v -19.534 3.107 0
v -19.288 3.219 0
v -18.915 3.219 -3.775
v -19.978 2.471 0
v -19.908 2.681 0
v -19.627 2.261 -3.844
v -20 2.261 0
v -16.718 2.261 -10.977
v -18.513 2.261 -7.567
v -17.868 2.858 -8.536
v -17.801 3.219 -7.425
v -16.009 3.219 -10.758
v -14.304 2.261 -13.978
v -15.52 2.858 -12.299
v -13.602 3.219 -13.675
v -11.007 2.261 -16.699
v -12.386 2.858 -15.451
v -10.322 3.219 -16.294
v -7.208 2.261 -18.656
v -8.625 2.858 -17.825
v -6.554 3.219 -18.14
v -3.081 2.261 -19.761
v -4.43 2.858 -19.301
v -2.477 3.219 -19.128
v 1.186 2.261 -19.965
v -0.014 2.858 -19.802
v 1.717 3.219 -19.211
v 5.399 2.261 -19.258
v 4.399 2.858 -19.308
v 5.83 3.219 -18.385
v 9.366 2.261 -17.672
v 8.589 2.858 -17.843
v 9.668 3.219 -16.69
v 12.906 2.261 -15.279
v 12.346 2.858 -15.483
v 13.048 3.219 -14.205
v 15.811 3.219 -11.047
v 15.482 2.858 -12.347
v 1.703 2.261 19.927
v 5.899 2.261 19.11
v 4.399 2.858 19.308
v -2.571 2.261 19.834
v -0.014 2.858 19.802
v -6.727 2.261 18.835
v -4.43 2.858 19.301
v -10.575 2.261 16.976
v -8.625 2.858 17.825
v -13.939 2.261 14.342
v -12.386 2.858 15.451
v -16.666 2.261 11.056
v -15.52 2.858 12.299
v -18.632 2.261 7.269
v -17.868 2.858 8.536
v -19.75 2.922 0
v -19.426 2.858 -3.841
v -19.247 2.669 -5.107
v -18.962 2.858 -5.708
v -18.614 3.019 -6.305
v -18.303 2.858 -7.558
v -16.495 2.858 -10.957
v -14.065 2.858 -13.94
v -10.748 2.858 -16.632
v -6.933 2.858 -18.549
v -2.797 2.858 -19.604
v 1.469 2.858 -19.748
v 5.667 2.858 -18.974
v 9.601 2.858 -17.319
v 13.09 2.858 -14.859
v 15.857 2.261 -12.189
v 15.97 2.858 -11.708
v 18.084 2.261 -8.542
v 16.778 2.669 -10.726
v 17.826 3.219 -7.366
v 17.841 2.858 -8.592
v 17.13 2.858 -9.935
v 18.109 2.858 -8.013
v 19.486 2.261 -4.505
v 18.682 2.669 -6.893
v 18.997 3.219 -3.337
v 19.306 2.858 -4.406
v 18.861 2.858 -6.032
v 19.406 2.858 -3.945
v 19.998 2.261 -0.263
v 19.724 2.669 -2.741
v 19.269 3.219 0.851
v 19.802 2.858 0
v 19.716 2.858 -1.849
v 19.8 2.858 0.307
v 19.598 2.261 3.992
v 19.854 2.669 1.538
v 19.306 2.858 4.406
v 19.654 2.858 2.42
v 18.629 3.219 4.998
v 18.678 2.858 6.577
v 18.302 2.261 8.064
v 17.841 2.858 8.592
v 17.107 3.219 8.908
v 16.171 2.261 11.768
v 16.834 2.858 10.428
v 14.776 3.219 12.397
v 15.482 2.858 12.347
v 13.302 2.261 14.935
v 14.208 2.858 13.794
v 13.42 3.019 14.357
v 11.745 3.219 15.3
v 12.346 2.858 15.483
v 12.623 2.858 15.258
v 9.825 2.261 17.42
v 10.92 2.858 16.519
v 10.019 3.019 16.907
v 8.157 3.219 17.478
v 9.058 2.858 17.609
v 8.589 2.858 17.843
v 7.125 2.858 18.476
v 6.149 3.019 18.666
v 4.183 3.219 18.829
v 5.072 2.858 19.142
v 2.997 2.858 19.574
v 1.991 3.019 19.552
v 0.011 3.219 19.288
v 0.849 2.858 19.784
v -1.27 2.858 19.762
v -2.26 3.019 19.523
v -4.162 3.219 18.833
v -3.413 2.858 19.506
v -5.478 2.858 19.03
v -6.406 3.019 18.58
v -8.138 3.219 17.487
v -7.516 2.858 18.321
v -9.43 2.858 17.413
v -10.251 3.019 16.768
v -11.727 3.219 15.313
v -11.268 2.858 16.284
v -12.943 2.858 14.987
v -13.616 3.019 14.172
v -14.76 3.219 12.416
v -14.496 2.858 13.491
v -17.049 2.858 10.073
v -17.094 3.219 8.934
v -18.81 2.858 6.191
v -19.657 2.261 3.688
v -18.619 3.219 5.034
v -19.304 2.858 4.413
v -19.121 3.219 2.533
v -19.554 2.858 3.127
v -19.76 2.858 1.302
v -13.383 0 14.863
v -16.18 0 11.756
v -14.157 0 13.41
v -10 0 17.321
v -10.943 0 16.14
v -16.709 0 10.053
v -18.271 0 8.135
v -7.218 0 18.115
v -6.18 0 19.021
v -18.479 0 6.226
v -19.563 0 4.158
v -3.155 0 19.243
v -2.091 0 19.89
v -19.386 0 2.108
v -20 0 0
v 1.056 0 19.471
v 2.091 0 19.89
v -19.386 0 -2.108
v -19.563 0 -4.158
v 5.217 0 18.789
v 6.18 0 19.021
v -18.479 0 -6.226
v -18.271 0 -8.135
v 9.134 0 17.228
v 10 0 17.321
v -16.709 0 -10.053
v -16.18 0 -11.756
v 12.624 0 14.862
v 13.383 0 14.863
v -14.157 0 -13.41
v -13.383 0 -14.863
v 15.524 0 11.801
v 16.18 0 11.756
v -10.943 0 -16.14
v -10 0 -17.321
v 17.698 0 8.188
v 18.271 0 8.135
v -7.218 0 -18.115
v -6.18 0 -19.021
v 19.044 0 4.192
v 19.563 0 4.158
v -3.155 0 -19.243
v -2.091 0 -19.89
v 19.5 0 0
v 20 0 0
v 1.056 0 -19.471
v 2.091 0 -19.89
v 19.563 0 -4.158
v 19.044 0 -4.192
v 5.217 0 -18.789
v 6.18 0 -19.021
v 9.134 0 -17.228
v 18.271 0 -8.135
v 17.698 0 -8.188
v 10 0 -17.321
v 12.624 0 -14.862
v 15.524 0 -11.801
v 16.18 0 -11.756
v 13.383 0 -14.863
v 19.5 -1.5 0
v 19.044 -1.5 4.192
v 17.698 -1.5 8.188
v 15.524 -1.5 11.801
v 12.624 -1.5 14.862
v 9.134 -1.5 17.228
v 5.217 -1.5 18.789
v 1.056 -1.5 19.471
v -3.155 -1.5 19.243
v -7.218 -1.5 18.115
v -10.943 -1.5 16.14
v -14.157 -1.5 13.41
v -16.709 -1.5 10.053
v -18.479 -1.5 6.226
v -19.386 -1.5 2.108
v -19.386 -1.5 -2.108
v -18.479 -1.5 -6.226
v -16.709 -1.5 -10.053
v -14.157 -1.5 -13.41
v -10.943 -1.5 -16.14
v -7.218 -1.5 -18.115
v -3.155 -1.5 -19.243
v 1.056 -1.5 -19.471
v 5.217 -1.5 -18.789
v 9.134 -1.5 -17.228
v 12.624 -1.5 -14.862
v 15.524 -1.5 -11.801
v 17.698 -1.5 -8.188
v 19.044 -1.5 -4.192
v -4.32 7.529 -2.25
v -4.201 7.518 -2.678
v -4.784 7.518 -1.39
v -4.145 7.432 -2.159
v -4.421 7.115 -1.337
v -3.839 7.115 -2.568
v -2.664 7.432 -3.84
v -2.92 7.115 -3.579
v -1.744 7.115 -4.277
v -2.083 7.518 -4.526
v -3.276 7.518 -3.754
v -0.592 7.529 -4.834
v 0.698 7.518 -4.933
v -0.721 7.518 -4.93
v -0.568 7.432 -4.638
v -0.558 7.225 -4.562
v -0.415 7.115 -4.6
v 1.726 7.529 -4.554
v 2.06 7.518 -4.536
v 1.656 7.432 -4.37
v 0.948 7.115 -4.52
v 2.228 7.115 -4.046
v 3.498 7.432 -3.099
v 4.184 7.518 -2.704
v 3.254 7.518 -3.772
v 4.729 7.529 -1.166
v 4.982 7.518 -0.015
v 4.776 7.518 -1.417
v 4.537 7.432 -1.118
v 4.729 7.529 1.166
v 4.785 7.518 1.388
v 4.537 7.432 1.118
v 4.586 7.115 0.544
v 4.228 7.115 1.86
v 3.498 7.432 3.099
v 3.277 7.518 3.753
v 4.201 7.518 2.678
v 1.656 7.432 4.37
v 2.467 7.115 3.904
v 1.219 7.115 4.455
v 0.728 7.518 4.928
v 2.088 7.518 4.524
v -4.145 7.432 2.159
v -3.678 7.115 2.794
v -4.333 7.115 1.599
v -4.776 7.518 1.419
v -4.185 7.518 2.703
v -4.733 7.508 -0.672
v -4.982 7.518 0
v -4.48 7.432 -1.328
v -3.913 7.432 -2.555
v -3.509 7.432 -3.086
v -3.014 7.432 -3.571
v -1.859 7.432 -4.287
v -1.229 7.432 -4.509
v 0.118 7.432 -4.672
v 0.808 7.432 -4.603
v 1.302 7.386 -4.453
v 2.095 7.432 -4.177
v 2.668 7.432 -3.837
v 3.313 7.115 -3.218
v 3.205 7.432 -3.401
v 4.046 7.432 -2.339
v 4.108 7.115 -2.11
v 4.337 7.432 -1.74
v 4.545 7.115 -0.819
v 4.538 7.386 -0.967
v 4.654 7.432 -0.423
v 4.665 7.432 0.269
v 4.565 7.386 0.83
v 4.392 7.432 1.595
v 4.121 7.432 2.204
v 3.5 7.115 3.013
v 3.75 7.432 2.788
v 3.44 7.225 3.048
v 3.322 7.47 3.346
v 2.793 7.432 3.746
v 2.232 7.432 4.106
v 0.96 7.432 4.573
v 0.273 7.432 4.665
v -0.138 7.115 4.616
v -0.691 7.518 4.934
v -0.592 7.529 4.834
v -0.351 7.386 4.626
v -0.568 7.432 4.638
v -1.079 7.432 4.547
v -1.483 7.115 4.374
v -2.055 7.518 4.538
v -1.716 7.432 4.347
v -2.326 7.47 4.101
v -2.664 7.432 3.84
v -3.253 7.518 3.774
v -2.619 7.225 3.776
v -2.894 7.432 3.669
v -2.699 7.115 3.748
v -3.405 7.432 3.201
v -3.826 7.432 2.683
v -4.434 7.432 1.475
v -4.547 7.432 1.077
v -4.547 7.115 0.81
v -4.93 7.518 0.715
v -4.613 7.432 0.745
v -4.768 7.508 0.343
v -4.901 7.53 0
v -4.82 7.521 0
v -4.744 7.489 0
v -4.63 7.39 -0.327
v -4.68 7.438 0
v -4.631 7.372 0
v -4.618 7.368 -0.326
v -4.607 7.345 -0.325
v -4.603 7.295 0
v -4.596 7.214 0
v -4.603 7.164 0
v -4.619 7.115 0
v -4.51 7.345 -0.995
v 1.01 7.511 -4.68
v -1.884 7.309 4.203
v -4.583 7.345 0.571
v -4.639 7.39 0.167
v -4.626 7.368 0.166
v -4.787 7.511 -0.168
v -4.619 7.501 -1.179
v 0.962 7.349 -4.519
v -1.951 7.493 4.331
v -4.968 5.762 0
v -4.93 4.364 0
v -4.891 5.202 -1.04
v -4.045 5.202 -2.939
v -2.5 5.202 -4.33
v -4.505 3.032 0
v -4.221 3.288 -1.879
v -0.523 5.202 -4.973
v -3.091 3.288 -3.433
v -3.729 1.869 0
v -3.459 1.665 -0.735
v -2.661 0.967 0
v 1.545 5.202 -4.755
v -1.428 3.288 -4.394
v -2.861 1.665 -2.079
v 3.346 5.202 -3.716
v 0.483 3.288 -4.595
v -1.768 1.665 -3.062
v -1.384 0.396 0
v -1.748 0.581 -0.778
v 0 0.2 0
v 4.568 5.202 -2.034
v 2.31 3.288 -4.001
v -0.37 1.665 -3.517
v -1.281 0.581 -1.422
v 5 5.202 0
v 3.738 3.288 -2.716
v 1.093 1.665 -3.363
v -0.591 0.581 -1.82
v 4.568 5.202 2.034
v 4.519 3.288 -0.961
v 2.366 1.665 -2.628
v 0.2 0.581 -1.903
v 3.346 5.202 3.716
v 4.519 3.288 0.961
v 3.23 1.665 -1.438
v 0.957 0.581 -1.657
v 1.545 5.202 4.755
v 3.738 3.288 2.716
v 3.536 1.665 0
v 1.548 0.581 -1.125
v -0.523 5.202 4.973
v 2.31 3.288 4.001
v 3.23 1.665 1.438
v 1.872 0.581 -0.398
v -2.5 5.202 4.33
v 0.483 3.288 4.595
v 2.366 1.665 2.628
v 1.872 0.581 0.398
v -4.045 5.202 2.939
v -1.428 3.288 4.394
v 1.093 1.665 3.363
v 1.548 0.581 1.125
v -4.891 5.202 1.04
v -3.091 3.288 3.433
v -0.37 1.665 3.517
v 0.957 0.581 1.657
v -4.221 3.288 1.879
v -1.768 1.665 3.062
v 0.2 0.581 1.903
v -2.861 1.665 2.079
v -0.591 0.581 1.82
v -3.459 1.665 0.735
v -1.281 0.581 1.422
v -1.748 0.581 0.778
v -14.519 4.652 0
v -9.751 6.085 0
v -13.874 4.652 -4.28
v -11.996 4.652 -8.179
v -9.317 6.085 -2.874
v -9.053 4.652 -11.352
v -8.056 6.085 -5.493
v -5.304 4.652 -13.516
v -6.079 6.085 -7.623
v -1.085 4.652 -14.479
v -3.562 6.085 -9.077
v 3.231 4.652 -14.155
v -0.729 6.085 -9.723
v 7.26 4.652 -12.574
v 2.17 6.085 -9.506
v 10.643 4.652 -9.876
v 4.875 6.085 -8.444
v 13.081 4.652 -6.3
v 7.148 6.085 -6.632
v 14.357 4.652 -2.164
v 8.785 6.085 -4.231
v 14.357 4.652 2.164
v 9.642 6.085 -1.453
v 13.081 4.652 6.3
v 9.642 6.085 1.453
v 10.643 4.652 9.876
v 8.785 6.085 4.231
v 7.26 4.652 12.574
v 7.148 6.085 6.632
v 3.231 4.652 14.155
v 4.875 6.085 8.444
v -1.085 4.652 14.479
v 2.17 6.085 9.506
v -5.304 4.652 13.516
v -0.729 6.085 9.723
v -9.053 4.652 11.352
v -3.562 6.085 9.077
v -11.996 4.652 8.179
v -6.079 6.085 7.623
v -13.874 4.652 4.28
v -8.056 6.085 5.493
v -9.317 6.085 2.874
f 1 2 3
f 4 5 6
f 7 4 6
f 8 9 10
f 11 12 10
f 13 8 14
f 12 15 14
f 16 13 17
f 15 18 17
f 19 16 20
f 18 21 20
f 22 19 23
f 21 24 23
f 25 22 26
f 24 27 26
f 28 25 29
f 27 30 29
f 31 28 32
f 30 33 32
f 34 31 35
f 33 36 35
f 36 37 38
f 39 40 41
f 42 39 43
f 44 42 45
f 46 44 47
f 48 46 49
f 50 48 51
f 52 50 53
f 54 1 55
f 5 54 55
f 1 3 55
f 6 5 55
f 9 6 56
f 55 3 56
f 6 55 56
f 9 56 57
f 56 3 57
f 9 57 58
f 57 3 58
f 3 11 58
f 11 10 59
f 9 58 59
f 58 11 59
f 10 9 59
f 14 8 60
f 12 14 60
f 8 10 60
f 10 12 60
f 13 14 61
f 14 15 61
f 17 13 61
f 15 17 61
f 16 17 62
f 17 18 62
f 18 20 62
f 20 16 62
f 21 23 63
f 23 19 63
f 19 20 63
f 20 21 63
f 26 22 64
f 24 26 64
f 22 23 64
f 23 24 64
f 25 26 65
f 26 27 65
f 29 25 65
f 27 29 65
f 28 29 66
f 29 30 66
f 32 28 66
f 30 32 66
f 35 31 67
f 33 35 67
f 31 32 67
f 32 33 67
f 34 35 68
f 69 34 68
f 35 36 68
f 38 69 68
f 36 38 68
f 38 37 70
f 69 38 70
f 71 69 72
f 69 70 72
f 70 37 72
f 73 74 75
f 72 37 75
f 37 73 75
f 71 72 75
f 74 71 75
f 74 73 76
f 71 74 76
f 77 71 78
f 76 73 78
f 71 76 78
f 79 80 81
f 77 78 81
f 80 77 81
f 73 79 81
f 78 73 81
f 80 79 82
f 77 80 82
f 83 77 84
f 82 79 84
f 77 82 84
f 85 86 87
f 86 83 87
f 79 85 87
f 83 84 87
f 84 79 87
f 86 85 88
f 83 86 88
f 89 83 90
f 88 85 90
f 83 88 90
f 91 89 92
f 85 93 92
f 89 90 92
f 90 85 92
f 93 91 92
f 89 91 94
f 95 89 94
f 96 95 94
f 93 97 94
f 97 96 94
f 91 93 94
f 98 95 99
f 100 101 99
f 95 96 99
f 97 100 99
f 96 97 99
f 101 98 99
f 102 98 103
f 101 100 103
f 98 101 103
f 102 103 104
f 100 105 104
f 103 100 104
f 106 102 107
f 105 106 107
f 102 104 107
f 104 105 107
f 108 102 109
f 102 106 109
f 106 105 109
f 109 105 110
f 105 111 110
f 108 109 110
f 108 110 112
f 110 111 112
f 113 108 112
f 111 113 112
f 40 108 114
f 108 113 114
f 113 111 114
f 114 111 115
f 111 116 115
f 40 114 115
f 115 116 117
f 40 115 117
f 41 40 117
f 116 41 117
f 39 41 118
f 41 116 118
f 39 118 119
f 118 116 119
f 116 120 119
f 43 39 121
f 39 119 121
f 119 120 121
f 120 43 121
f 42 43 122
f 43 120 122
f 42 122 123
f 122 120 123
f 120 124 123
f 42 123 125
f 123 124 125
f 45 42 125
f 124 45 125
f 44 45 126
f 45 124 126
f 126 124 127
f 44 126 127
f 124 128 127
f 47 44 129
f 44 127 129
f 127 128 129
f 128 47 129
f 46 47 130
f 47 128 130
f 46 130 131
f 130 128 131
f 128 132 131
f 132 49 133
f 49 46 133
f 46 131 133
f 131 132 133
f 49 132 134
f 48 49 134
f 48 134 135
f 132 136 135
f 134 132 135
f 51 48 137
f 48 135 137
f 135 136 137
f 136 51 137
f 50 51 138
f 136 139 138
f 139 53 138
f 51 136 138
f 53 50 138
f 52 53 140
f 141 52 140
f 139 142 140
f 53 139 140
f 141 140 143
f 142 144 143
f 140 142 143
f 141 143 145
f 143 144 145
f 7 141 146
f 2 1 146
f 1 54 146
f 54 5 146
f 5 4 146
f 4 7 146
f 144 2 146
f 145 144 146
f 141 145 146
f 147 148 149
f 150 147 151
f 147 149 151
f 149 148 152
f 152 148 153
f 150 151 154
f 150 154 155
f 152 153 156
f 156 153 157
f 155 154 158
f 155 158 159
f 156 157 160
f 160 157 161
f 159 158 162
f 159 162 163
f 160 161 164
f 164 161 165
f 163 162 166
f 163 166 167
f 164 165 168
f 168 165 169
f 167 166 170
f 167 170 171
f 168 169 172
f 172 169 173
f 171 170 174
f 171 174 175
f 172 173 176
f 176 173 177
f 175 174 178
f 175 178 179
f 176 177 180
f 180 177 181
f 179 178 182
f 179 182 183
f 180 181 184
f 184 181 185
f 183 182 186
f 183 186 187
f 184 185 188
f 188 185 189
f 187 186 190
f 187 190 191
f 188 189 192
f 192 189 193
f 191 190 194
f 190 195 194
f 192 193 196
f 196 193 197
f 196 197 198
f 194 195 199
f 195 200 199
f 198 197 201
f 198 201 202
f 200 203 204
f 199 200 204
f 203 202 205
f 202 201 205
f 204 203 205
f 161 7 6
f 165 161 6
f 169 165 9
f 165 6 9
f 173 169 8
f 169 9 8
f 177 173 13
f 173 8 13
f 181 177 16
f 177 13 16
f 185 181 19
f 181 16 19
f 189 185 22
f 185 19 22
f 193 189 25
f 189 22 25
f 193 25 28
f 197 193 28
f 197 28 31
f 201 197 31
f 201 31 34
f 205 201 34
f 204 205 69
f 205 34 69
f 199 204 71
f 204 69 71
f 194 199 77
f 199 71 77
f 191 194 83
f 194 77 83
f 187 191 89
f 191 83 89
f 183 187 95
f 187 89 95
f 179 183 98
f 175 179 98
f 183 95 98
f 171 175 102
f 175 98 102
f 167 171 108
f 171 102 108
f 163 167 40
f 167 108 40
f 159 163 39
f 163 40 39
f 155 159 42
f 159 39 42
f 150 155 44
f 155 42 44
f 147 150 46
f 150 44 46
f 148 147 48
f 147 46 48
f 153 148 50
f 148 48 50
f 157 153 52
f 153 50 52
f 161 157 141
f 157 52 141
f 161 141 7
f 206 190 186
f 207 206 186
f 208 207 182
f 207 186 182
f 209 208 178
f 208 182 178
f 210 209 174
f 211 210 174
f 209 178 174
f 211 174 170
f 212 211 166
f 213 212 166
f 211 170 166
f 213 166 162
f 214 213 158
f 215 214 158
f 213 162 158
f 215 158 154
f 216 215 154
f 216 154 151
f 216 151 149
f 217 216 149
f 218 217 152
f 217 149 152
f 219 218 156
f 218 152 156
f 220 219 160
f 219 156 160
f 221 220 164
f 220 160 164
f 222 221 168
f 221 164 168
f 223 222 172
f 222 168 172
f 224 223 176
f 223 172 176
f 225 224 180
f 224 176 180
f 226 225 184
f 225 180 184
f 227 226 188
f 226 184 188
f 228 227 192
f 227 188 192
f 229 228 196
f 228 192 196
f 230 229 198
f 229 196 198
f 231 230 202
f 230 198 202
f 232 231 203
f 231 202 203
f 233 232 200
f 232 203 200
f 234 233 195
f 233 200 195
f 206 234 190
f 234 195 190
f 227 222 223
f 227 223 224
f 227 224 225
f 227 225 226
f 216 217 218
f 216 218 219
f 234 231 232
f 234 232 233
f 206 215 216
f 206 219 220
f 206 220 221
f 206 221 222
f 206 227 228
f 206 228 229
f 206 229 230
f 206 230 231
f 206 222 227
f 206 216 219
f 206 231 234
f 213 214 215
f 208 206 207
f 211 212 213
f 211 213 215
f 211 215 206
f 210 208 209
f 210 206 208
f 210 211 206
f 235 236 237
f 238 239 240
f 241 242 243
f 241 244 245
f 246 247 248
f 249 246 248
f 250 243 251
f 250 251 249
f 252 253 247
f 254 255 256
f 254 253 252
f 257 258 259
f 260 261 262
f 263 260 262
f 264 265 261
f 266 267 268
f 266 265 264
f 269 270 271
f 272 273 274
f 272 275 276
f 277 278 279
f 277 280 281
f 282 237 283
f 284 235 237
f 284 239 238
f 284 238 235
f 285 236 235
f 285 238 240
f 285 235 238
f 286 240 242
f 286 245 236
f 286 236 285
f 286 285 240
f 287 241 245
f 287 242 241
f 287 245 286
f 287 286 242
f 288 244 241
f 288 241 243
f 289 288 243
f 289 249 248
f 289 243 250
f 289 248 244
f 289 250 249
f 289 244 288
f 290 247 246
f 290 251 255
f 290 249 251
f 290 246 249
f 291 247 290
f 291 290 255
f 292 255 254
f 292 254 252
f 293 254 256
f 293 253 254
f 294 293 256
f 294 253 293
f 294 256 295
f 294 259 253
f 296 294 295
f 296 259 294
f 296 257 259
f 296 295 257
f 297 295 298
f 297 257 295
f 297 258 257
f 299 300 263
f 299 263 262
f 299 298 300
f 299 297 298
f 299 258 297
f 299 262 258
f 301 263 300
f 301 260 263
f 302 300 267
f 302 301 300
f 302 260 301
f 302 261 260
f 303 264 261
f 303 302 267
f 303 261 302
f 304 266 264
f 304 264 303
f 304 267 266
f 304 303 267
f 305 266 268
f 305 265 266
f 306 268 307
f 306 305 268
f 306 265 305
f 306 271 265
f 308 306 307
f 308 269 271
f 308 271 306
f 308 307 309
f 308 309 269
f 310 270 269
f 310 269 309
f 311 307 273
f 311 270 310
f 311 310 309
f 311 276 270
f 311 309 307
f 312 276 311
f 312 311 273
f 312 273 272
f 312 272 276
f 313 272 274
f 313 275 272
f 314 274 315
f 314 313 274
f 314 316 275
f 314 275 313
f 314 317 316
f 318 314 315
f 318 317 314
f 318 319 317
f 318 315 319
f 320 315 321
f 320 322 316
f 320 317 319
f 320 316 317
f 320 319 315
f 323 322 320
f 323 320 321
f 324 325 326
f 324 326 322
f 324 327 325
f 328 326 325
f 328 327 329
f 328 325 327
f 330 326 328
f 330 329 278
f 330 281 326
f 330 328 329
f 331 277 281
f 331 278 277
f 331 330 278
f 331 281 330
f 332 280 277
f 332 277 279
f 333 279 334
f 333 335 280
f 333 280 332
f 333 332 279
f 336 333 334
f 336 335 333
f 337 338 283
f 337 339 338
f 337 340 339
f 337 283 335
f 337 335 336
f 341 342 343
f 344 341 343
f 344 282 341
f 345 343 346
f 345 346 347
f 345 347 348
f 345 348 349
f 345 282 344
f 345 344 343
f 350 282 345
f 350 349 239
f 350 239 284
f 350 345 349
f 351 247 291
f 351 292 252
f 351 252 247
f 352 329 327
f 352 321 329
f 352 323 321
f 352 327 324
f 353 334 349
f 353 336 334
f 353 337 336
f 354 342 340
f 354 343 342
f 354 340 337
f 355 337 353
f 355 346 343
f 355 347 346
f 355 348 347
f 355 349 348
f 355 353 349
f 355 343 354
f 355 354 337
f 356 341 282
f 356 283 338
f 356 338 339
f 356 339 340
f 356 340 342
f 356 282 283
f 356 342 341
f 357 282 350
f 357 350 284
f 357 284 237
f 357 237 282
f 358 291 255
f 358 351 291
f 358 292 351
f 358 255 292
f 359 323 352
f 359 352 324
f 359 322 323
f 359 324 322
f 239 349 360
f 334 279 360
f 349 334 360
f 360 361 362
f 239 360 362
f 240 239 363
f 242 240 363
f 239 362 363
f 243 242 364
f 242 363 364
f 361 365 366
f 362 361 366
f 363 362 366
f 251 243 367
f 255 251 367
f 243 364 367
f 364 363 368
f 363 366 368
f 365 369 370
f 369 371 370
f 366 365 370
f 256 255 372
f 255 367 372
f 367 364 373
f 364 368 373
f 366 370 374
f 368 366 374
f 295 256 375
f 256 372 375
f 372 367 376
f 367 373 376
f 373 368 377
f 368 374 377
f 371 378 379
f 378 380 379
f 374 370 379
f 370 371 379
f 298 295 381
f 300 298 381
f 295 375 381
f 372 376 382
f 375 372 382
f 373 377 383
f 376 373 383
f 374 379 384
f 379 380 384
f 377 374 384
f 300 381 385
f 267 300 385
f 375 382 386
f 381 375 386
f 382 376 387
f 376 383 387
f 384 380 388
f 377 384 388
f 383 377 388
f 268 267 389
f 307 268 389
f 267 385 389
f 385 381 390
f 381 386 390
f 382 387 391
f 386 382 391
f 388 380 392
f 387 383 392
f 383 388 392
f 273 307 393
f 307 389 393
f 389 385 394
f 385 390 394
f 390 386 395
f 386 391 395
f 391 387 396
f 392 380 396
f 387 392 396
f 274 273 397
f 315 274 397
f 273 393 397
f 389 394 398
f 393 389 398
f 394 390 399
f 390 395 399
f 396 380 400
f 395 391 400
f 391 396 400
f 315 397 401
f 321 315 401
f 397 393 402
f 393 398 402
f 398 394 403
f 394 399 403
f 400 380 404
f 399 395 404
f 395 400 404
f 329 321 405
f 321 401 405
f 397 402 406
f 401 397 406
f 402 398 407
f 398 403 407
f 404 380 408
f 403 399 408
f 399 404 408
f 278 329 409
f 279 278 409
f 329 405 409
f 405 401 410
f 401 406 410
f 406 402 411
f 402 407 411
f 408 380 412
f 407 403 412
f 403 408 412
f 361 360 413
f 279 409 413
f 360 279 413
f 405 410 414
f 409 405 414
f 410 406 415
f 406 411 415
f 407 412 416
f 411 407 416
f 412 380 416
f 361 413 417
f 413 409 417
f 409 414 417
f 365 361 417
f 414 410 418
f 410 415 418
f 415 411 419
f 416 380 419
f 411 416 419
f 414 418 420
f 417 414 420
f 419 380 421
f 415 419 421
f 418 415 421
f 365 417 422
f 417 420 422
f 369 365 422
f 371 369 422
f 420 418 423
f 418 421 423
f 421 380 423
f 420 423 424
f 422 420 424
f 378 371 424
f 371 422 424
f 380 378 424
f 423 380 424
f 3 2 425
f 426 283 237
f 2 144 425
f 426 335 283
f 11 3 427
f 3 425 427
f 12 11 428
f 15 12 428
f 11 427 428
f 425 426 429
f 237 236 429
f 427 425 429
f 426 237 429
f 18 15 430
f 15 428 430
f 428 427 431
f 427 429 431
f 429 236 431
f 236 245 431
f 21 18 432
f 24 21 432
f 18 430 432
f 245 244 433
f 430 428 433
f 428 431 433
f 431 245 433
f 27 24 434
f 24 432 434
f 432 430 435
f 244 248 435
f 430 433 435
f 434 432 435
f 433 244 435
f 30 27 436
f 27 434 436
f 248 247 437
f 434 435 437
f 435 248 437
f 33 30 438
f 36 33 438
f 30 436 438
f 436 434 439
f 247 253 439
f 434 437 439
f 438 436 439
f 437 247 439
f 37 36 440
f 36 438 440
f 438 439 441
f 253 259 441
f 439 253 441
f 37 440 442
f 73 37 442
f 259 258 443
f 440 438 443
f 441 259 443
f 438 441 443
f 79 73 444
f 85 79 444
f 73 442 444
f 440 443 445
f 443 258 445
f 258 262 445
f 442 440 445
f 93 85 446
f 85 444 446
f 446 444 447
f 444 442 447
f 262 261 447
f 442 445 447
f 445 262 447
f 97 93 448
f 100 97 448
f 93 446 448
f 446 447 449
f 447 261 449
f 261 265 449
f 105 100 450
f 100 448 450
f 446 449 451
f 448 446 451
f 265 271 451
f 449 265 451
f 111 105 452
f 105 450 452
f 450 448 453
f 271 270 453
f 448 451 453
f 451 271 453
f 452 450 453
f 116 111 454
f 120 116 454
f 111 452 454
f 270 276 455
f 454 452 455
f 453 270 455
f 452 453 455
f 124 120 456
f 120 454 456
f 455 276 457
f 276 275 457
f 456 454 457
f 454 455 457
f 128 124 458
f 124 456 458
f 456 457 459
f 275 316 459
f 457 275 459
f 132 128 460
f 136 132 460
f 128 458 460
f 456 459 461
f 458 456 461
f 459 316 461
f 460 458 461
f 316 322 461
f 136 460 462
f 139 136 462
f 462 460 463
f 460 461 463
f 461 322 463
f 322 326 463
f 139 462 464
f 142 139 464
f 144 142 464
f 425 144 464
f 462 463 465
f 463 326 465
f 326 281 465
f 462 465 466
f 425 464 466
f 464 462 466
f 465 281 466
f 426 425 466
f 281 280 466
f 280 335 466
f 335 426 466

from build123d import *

# Parameters (mm, degrees)
FILLET1_R           = 0.3
SKETCH4_R           = 19.5
BOSS_EXTRUDE1_DEPTH = 1.5
FILLET2_R           = 1


with BuildPart() as part:
    # Sketch2 → Revolve1 (revolve)
    with BuildSketch(Plane.XY):
        Polygon((0, 0), (-20, 0), (-20, 3.004926108), (0, 9.014778325), align=None)
    revolve(axis=Axis((0, 35.024630542, 0), (0, -1, 0)))

    # Sketch3 → Cut-Revolve2 (revolve, cut)
    with BuildSketch(Plane.XY):
        with BuildLine():
            Line((0, 0.2), (0, 10.2))
            ThreePointArc((0, 10.2), (-5, 5.2), (0, 0.2))
        make_face()
    revolve(axis=Axis((0, 12.296737064, 0), (0, -1, 0)), mode=Mode.SUBTRACT)

    # Fillet1
    fillet1_edges = [part.edges().sort_by_distance(p)[0] for p in [
        (4.320571191, 7.716478608, 0),
    ]]
    fillet(fillet1_edges, radius=FILLET1_R)

    # Sketch4 → Boss-Extrude1 (add)
    with BuildSketch(Plane.XZ):
        Circle(SKETCH4_R)
    extrude(amount=BOSS_EXTRUDE1_DEPTH)

    # Fillet2
    fillet2_edges = [part.edges().sort_by_distance(p)[0] for p in [
        (20, 3.004926108, 0),
    ]]
    fillet(fillet2_edges, radius=FILLET2_R)


solid = part.part
